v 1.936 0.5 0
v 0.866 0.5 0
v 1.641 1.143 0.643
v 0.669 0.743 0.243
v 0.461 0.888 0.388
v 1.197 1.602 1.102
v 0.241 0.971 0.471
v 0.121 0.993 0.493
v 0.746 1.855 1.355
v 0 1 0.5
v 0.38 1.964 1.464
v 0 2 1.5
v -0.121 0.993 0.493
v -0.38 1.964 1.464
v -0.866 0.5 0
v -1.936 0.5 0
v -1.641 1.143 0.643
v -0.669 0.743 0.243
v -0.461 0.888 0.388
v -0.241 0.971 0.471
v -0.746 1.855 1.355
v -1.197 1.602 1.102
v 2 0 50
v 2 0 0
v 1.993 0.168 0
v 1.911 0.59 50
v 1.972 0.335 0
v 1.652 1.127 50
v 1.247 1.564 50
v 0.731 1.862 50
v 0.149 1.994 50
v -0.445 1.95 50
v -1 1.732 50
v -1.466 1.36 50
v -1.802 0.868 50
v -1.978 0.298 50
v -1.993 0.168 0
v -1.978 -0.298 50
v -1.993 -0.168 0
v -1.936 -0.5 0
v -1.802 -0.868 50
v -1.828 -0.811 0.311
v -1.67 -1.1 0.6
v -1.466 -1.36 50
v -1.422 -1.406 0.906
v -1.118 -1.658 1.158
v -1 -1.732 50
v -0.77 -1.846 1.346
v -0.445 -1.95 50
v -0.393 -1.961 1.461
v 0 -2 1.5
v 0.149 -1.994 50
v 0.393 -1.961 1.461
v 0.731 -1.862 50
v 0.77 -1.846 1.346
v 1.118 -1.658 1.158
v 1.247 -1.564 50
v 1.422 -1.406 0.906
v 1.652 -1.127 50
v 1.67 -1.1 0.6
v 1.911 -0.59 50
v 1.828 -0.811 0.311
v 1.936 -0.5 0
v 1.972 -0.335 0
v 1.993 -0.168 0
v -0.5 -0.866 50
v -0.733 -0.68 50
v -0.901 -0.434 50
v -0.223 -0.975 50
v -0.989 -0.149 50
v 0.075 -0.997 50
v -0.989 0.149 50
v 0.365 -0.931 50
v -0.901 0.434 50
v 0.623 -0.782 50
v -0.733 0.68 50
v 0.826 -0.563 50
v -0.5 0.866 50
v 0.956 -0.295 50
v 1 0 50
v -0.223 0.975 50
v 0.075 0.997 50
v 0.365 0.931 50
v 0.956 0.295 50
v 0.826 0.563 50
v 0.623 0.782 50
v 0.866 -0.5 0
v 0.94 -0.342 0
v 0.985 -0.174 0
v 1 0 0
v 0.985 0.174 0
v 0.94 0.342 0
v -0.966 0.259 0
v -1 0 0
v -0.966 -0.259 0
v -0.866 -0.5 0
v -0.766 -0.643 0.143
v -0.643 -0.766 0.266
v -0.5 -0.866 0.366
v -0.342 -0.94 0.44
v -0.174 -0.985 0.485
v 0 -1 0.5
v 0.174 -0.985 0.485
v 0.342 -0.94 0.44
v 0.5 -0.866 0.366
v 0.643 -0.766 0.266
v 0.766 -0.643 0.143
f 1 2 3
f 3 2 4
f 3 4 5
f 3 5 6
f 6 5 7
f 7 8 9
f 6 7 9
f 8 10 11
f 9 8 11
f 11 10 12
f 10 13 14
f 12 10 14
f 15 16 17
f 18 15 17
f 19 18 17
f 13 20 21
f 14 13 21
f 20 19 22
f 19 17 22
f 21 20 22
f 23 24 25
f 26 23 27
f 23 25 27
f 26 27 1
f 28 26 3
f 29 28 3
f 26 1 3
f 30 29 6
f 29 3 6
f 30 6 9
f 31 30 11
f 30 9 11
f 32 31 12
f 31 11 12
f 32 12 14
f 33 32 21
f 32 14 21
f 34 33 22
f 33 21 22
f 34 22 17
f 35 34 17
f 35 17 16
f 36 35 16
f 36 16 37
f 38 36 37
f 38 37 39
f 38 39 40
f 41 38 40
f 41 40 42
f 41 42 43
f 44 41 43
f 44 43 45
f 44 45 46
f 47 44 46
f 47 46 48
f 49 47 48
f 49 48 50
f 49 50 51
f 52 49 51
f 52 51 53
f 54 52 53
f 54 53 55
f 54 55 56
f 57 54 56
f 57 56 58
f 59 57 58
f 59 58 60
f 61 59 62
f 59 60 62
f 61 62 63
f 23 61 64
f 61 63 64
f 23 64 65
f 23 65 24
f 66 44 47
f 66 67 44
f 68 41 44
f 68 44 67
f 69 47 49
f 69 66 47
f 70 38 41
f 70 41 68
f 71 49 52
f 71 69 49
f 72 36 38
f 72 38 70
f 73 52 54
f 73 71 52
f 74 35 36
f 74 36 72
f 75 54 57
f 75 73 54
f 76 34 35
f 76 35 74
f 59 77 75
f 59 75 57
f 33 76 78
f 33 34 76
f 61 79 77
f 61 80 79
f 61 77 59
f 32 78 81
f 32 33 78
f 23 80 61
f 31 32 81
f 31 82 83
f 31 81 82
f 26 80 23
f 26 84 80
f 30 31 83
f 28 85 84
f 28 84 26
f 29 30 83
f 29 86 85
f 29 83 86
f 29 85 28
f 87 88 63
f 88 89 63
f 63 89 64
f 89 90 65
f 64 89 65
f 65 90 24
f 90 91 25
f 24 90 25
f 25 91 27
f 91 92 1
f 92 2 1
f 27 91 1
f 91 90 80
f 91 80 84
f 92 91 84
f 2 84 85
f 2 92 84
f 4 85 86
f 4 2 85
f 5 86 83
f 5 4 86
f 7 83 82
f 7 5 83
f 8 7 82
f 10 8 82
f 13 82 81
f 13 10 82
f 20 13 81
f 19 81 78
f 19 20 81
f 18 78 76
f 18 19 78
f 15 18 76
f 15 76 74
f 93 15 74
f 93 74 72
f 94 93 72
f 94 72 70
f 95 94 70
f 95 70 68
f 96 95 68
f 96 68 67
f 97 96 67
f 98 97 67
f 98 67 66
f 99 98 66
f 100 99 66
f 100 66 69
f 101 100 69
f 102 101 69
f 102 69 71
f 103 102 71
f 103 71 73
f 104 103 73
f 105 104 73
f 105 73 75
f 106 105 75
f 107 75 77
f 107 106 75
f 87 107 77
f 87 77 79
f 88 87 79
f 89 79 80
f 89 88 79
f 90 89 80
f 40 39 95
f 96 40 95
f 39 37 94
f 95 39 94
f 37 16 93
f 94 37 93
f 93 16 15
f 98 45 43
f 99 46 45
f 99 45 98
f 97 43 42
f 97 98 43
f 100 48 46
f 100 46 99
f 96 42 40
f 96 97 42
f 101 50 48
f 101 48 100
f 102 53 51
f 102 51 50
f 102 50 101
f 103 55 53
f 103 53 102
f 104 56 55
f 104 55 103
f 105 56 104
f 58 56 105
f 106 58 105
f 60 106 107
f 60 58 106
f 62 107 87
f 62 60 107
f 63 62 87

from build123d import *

# Parameters (mm, degrees)
SKETCH089_R          = 2
SKETCH089_R_2        = 1
PAD030_DEPTH         = 50
POCKET025_DEPTH      = 2.001
POCKET025_DEPTH_BACK = -2.001


with BuildPart() as part:
    # Sketch089 → Pad030 (new body)
    with BuildSketch(Plane.XY):
        Circle(SKETCH089_R)
        Circle(SKETCH089_R_2, mode=Mode.SUBTRACT)
    extrude(amount=PAD030_DEPTH)

    # Sketch090 → Pocket025 (cut, two sides)
    with BuildSketch(Plane.YZ) as pocket025_sk:
        Polygon((0, -0.5), (4, 3.5), (4, -3.5), (-4, -3.5), (-4, 3.5), align=None)
    extrude(amount=-POCKET025_DEPTH, mode=Mode.SUBTRACT)
    extrude(pocket025_sk.sketch, amount=-POCKET025_DEPTH_BACK, mode=Mode.SUBTRACT)


solid = part.part
